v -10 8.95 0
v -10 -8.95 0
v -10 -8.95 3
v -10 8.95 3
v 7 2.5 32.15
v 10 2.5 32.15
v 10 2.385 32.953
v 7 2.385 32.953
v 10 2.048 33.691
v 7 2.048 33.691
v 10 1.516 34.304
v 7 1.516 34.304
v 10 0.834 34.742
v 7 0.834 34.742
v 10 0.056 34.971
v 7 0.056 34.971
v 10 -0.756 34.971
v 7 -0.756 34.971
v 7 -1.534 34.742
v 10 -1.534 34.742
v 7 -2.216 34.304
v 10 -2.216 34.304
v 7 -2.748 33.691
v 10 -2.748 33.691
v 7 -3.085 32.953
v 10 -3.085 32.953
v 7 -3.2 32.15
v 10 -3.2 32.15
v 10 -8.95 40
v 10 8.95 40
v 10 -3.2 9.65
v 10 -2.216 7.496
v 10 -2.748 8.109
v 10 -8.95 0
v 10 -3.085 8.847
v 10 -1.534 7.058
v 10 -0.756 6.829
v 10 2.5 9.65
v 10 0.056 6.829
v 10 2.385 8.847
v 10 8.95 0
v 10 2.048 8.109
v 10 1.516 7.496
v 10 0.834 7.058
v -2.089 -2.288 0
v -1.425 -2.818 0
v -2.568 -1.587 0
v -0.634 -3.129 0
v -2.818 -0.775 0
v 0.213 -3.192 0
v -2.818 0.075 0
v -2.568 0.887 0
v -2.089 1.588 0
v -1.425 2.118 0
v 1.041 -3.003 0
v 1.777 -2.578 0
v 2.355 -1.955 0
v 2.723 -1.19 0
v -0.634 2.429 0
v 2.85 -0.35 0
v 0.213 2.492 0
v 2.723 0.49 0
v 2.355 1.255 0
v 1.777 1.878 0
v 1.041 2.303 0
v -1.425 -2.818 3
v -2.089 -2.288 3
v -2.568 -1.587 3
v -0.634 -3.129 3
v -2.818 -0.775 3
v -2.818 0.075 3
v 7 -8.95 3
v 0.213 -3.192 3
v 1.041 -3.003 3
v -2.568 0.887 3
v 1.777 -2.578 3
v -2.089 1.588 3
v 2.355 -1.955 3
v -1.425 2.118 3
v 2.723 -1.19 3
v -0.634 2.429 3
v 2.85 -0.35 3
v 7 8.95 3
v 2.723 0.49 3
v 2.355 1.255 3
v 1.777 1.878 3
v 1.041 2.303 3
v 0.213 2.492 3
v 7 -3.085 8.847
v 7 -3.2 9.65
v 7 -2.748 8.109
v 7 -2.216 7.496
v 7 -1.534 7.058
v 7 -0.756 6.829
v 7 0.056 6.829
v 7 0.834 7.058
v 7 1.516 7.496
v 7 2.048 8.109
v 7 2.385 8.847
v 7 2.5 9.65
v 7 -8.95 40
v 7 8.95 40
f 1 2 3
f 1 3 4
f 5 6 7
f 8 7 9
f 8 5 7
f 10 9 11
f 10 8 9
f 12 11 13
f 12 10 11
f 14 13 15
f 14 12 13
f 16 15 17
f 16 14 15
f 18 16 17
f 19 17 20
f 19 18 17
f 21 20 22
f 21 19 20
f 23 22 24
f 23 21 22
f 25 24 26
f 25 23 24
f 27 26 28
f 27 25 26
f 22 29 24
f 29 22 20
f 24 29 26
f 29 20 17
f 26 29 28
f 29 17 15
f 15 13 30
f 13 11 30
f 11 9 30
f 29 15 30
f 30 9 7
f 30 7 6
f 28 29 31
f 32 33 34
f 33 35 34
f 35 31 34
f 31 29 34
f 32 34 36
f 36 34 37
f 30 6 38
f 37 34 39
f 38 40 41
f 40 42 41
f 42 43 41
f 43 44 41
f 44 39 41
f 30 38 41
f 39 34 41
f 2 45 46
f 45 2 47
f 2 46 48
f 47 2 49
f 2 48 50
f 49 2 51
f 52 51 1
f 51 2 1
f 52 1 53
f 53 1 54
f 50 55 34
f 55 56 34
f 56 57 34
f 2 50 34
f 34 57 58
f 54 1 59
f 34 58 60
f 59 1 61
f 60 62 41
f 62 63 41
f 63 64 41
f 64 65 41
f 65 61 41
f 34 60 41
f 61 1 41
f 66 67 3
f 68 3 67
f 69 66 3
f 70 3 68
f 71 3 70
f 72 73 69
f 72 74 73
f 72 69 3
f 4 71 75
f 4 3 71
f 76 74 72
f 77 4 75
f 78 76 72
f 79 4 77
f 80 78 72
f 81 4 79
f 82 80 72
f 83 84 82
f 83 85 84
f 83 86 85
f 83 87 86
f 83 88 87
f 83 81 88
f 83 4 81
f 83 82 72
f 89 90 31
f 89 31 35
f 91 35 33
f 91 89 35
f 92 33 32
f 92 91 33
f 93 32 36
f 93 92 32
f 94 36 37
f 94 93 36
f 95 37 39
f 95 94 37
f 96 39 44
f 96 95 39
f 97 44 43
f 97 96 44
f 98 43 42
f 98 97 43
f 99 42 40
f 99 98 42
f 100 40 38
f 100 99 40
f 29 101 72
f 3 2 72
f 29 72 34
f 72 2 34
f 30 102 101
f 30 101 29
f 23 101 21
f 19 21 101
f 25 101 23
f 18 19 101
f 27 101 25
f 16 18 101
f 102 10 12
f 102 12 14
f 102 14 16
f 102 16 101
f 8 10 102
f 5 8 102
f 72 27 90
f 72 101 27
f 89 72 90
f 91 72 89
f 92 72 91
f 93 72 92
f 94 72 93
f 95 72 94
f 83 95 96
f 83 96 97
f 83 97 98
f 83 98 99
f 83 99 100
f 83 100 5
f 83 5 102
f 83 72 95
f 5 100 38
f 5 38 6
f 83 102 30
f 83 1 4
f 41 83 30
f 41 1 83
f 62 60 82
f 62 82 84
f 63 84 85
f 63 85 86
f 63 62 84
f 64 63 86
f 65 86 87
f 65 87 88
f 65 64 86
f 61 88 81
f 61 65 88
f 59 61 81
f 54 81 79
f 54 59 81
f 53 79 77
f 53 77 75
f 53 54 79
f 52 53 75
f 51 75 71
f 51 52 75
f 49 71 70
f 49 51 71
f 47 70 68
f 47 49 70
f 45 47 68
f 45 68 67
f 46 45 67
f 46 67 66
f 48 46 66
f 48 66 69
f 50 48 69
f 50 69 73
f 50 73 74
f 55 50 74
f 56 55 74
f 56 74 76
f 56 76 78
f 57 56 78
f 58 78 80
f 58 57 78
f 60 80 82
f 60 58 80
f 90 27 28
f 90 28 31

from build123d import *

# Parameters (mm, degrees)
SKETCH_1_W          = 20
SKETCH_1_H          = 17.9
SKETCH_1_R          = 2.85
EXTRUDE_1_DEPTH     = 3
SKETCH_2_W          = 3
SKETCH_2_H          = 17.9
EXTRUDE_2_DEPTH     = 37
CUT_EXTRUDE_1_DEPTH = 37


with BuildPart() as part:
    # 草图1 → 凸台-拉伸1 (new body)
    with BuildSketch(Plane.XY):
        Rectangle(SKETCH_1_W, SKETCH_1_H)
        with Locations((0, -0.35)):
            Circle(SKETCH_1_R, mode=Mode.SUBTRACT)
    extrude(amount=EXTRUDE_1_DEPTH)

    # 草图2 → 凸台-拉伸2 (add)
    with BuildSketch(Plane.XY.offset(3)):
        with Locations((8.5, 0)):
            Rectangle(SKETCH_2_W, SKETCH_2_H)
    extrude(amount=EXTRUDE_2_DEPTH)

    # 草图3 → 切除-拉伸1 (cut)
    with BuildSketch(Plane.ZY.offset(-7)):
        with BuildLine():
            Line((32.15, -3.2), (9.65, -3.2))
            ThreePointArc((9.65, -3.2), (6.8, -0.35), (9.65, 2.5))
            Line((9.65, 2.5), (32.15, 2.5))
            ThreePointArc((32.15, 2.5), (35, -0.35), (32.15, -3.2))
        make_face()
    extrude(amount=-CUT_EXTRUDE_1_DEPTH, mode=Mode.SUBTRACT)


solid = part.part
